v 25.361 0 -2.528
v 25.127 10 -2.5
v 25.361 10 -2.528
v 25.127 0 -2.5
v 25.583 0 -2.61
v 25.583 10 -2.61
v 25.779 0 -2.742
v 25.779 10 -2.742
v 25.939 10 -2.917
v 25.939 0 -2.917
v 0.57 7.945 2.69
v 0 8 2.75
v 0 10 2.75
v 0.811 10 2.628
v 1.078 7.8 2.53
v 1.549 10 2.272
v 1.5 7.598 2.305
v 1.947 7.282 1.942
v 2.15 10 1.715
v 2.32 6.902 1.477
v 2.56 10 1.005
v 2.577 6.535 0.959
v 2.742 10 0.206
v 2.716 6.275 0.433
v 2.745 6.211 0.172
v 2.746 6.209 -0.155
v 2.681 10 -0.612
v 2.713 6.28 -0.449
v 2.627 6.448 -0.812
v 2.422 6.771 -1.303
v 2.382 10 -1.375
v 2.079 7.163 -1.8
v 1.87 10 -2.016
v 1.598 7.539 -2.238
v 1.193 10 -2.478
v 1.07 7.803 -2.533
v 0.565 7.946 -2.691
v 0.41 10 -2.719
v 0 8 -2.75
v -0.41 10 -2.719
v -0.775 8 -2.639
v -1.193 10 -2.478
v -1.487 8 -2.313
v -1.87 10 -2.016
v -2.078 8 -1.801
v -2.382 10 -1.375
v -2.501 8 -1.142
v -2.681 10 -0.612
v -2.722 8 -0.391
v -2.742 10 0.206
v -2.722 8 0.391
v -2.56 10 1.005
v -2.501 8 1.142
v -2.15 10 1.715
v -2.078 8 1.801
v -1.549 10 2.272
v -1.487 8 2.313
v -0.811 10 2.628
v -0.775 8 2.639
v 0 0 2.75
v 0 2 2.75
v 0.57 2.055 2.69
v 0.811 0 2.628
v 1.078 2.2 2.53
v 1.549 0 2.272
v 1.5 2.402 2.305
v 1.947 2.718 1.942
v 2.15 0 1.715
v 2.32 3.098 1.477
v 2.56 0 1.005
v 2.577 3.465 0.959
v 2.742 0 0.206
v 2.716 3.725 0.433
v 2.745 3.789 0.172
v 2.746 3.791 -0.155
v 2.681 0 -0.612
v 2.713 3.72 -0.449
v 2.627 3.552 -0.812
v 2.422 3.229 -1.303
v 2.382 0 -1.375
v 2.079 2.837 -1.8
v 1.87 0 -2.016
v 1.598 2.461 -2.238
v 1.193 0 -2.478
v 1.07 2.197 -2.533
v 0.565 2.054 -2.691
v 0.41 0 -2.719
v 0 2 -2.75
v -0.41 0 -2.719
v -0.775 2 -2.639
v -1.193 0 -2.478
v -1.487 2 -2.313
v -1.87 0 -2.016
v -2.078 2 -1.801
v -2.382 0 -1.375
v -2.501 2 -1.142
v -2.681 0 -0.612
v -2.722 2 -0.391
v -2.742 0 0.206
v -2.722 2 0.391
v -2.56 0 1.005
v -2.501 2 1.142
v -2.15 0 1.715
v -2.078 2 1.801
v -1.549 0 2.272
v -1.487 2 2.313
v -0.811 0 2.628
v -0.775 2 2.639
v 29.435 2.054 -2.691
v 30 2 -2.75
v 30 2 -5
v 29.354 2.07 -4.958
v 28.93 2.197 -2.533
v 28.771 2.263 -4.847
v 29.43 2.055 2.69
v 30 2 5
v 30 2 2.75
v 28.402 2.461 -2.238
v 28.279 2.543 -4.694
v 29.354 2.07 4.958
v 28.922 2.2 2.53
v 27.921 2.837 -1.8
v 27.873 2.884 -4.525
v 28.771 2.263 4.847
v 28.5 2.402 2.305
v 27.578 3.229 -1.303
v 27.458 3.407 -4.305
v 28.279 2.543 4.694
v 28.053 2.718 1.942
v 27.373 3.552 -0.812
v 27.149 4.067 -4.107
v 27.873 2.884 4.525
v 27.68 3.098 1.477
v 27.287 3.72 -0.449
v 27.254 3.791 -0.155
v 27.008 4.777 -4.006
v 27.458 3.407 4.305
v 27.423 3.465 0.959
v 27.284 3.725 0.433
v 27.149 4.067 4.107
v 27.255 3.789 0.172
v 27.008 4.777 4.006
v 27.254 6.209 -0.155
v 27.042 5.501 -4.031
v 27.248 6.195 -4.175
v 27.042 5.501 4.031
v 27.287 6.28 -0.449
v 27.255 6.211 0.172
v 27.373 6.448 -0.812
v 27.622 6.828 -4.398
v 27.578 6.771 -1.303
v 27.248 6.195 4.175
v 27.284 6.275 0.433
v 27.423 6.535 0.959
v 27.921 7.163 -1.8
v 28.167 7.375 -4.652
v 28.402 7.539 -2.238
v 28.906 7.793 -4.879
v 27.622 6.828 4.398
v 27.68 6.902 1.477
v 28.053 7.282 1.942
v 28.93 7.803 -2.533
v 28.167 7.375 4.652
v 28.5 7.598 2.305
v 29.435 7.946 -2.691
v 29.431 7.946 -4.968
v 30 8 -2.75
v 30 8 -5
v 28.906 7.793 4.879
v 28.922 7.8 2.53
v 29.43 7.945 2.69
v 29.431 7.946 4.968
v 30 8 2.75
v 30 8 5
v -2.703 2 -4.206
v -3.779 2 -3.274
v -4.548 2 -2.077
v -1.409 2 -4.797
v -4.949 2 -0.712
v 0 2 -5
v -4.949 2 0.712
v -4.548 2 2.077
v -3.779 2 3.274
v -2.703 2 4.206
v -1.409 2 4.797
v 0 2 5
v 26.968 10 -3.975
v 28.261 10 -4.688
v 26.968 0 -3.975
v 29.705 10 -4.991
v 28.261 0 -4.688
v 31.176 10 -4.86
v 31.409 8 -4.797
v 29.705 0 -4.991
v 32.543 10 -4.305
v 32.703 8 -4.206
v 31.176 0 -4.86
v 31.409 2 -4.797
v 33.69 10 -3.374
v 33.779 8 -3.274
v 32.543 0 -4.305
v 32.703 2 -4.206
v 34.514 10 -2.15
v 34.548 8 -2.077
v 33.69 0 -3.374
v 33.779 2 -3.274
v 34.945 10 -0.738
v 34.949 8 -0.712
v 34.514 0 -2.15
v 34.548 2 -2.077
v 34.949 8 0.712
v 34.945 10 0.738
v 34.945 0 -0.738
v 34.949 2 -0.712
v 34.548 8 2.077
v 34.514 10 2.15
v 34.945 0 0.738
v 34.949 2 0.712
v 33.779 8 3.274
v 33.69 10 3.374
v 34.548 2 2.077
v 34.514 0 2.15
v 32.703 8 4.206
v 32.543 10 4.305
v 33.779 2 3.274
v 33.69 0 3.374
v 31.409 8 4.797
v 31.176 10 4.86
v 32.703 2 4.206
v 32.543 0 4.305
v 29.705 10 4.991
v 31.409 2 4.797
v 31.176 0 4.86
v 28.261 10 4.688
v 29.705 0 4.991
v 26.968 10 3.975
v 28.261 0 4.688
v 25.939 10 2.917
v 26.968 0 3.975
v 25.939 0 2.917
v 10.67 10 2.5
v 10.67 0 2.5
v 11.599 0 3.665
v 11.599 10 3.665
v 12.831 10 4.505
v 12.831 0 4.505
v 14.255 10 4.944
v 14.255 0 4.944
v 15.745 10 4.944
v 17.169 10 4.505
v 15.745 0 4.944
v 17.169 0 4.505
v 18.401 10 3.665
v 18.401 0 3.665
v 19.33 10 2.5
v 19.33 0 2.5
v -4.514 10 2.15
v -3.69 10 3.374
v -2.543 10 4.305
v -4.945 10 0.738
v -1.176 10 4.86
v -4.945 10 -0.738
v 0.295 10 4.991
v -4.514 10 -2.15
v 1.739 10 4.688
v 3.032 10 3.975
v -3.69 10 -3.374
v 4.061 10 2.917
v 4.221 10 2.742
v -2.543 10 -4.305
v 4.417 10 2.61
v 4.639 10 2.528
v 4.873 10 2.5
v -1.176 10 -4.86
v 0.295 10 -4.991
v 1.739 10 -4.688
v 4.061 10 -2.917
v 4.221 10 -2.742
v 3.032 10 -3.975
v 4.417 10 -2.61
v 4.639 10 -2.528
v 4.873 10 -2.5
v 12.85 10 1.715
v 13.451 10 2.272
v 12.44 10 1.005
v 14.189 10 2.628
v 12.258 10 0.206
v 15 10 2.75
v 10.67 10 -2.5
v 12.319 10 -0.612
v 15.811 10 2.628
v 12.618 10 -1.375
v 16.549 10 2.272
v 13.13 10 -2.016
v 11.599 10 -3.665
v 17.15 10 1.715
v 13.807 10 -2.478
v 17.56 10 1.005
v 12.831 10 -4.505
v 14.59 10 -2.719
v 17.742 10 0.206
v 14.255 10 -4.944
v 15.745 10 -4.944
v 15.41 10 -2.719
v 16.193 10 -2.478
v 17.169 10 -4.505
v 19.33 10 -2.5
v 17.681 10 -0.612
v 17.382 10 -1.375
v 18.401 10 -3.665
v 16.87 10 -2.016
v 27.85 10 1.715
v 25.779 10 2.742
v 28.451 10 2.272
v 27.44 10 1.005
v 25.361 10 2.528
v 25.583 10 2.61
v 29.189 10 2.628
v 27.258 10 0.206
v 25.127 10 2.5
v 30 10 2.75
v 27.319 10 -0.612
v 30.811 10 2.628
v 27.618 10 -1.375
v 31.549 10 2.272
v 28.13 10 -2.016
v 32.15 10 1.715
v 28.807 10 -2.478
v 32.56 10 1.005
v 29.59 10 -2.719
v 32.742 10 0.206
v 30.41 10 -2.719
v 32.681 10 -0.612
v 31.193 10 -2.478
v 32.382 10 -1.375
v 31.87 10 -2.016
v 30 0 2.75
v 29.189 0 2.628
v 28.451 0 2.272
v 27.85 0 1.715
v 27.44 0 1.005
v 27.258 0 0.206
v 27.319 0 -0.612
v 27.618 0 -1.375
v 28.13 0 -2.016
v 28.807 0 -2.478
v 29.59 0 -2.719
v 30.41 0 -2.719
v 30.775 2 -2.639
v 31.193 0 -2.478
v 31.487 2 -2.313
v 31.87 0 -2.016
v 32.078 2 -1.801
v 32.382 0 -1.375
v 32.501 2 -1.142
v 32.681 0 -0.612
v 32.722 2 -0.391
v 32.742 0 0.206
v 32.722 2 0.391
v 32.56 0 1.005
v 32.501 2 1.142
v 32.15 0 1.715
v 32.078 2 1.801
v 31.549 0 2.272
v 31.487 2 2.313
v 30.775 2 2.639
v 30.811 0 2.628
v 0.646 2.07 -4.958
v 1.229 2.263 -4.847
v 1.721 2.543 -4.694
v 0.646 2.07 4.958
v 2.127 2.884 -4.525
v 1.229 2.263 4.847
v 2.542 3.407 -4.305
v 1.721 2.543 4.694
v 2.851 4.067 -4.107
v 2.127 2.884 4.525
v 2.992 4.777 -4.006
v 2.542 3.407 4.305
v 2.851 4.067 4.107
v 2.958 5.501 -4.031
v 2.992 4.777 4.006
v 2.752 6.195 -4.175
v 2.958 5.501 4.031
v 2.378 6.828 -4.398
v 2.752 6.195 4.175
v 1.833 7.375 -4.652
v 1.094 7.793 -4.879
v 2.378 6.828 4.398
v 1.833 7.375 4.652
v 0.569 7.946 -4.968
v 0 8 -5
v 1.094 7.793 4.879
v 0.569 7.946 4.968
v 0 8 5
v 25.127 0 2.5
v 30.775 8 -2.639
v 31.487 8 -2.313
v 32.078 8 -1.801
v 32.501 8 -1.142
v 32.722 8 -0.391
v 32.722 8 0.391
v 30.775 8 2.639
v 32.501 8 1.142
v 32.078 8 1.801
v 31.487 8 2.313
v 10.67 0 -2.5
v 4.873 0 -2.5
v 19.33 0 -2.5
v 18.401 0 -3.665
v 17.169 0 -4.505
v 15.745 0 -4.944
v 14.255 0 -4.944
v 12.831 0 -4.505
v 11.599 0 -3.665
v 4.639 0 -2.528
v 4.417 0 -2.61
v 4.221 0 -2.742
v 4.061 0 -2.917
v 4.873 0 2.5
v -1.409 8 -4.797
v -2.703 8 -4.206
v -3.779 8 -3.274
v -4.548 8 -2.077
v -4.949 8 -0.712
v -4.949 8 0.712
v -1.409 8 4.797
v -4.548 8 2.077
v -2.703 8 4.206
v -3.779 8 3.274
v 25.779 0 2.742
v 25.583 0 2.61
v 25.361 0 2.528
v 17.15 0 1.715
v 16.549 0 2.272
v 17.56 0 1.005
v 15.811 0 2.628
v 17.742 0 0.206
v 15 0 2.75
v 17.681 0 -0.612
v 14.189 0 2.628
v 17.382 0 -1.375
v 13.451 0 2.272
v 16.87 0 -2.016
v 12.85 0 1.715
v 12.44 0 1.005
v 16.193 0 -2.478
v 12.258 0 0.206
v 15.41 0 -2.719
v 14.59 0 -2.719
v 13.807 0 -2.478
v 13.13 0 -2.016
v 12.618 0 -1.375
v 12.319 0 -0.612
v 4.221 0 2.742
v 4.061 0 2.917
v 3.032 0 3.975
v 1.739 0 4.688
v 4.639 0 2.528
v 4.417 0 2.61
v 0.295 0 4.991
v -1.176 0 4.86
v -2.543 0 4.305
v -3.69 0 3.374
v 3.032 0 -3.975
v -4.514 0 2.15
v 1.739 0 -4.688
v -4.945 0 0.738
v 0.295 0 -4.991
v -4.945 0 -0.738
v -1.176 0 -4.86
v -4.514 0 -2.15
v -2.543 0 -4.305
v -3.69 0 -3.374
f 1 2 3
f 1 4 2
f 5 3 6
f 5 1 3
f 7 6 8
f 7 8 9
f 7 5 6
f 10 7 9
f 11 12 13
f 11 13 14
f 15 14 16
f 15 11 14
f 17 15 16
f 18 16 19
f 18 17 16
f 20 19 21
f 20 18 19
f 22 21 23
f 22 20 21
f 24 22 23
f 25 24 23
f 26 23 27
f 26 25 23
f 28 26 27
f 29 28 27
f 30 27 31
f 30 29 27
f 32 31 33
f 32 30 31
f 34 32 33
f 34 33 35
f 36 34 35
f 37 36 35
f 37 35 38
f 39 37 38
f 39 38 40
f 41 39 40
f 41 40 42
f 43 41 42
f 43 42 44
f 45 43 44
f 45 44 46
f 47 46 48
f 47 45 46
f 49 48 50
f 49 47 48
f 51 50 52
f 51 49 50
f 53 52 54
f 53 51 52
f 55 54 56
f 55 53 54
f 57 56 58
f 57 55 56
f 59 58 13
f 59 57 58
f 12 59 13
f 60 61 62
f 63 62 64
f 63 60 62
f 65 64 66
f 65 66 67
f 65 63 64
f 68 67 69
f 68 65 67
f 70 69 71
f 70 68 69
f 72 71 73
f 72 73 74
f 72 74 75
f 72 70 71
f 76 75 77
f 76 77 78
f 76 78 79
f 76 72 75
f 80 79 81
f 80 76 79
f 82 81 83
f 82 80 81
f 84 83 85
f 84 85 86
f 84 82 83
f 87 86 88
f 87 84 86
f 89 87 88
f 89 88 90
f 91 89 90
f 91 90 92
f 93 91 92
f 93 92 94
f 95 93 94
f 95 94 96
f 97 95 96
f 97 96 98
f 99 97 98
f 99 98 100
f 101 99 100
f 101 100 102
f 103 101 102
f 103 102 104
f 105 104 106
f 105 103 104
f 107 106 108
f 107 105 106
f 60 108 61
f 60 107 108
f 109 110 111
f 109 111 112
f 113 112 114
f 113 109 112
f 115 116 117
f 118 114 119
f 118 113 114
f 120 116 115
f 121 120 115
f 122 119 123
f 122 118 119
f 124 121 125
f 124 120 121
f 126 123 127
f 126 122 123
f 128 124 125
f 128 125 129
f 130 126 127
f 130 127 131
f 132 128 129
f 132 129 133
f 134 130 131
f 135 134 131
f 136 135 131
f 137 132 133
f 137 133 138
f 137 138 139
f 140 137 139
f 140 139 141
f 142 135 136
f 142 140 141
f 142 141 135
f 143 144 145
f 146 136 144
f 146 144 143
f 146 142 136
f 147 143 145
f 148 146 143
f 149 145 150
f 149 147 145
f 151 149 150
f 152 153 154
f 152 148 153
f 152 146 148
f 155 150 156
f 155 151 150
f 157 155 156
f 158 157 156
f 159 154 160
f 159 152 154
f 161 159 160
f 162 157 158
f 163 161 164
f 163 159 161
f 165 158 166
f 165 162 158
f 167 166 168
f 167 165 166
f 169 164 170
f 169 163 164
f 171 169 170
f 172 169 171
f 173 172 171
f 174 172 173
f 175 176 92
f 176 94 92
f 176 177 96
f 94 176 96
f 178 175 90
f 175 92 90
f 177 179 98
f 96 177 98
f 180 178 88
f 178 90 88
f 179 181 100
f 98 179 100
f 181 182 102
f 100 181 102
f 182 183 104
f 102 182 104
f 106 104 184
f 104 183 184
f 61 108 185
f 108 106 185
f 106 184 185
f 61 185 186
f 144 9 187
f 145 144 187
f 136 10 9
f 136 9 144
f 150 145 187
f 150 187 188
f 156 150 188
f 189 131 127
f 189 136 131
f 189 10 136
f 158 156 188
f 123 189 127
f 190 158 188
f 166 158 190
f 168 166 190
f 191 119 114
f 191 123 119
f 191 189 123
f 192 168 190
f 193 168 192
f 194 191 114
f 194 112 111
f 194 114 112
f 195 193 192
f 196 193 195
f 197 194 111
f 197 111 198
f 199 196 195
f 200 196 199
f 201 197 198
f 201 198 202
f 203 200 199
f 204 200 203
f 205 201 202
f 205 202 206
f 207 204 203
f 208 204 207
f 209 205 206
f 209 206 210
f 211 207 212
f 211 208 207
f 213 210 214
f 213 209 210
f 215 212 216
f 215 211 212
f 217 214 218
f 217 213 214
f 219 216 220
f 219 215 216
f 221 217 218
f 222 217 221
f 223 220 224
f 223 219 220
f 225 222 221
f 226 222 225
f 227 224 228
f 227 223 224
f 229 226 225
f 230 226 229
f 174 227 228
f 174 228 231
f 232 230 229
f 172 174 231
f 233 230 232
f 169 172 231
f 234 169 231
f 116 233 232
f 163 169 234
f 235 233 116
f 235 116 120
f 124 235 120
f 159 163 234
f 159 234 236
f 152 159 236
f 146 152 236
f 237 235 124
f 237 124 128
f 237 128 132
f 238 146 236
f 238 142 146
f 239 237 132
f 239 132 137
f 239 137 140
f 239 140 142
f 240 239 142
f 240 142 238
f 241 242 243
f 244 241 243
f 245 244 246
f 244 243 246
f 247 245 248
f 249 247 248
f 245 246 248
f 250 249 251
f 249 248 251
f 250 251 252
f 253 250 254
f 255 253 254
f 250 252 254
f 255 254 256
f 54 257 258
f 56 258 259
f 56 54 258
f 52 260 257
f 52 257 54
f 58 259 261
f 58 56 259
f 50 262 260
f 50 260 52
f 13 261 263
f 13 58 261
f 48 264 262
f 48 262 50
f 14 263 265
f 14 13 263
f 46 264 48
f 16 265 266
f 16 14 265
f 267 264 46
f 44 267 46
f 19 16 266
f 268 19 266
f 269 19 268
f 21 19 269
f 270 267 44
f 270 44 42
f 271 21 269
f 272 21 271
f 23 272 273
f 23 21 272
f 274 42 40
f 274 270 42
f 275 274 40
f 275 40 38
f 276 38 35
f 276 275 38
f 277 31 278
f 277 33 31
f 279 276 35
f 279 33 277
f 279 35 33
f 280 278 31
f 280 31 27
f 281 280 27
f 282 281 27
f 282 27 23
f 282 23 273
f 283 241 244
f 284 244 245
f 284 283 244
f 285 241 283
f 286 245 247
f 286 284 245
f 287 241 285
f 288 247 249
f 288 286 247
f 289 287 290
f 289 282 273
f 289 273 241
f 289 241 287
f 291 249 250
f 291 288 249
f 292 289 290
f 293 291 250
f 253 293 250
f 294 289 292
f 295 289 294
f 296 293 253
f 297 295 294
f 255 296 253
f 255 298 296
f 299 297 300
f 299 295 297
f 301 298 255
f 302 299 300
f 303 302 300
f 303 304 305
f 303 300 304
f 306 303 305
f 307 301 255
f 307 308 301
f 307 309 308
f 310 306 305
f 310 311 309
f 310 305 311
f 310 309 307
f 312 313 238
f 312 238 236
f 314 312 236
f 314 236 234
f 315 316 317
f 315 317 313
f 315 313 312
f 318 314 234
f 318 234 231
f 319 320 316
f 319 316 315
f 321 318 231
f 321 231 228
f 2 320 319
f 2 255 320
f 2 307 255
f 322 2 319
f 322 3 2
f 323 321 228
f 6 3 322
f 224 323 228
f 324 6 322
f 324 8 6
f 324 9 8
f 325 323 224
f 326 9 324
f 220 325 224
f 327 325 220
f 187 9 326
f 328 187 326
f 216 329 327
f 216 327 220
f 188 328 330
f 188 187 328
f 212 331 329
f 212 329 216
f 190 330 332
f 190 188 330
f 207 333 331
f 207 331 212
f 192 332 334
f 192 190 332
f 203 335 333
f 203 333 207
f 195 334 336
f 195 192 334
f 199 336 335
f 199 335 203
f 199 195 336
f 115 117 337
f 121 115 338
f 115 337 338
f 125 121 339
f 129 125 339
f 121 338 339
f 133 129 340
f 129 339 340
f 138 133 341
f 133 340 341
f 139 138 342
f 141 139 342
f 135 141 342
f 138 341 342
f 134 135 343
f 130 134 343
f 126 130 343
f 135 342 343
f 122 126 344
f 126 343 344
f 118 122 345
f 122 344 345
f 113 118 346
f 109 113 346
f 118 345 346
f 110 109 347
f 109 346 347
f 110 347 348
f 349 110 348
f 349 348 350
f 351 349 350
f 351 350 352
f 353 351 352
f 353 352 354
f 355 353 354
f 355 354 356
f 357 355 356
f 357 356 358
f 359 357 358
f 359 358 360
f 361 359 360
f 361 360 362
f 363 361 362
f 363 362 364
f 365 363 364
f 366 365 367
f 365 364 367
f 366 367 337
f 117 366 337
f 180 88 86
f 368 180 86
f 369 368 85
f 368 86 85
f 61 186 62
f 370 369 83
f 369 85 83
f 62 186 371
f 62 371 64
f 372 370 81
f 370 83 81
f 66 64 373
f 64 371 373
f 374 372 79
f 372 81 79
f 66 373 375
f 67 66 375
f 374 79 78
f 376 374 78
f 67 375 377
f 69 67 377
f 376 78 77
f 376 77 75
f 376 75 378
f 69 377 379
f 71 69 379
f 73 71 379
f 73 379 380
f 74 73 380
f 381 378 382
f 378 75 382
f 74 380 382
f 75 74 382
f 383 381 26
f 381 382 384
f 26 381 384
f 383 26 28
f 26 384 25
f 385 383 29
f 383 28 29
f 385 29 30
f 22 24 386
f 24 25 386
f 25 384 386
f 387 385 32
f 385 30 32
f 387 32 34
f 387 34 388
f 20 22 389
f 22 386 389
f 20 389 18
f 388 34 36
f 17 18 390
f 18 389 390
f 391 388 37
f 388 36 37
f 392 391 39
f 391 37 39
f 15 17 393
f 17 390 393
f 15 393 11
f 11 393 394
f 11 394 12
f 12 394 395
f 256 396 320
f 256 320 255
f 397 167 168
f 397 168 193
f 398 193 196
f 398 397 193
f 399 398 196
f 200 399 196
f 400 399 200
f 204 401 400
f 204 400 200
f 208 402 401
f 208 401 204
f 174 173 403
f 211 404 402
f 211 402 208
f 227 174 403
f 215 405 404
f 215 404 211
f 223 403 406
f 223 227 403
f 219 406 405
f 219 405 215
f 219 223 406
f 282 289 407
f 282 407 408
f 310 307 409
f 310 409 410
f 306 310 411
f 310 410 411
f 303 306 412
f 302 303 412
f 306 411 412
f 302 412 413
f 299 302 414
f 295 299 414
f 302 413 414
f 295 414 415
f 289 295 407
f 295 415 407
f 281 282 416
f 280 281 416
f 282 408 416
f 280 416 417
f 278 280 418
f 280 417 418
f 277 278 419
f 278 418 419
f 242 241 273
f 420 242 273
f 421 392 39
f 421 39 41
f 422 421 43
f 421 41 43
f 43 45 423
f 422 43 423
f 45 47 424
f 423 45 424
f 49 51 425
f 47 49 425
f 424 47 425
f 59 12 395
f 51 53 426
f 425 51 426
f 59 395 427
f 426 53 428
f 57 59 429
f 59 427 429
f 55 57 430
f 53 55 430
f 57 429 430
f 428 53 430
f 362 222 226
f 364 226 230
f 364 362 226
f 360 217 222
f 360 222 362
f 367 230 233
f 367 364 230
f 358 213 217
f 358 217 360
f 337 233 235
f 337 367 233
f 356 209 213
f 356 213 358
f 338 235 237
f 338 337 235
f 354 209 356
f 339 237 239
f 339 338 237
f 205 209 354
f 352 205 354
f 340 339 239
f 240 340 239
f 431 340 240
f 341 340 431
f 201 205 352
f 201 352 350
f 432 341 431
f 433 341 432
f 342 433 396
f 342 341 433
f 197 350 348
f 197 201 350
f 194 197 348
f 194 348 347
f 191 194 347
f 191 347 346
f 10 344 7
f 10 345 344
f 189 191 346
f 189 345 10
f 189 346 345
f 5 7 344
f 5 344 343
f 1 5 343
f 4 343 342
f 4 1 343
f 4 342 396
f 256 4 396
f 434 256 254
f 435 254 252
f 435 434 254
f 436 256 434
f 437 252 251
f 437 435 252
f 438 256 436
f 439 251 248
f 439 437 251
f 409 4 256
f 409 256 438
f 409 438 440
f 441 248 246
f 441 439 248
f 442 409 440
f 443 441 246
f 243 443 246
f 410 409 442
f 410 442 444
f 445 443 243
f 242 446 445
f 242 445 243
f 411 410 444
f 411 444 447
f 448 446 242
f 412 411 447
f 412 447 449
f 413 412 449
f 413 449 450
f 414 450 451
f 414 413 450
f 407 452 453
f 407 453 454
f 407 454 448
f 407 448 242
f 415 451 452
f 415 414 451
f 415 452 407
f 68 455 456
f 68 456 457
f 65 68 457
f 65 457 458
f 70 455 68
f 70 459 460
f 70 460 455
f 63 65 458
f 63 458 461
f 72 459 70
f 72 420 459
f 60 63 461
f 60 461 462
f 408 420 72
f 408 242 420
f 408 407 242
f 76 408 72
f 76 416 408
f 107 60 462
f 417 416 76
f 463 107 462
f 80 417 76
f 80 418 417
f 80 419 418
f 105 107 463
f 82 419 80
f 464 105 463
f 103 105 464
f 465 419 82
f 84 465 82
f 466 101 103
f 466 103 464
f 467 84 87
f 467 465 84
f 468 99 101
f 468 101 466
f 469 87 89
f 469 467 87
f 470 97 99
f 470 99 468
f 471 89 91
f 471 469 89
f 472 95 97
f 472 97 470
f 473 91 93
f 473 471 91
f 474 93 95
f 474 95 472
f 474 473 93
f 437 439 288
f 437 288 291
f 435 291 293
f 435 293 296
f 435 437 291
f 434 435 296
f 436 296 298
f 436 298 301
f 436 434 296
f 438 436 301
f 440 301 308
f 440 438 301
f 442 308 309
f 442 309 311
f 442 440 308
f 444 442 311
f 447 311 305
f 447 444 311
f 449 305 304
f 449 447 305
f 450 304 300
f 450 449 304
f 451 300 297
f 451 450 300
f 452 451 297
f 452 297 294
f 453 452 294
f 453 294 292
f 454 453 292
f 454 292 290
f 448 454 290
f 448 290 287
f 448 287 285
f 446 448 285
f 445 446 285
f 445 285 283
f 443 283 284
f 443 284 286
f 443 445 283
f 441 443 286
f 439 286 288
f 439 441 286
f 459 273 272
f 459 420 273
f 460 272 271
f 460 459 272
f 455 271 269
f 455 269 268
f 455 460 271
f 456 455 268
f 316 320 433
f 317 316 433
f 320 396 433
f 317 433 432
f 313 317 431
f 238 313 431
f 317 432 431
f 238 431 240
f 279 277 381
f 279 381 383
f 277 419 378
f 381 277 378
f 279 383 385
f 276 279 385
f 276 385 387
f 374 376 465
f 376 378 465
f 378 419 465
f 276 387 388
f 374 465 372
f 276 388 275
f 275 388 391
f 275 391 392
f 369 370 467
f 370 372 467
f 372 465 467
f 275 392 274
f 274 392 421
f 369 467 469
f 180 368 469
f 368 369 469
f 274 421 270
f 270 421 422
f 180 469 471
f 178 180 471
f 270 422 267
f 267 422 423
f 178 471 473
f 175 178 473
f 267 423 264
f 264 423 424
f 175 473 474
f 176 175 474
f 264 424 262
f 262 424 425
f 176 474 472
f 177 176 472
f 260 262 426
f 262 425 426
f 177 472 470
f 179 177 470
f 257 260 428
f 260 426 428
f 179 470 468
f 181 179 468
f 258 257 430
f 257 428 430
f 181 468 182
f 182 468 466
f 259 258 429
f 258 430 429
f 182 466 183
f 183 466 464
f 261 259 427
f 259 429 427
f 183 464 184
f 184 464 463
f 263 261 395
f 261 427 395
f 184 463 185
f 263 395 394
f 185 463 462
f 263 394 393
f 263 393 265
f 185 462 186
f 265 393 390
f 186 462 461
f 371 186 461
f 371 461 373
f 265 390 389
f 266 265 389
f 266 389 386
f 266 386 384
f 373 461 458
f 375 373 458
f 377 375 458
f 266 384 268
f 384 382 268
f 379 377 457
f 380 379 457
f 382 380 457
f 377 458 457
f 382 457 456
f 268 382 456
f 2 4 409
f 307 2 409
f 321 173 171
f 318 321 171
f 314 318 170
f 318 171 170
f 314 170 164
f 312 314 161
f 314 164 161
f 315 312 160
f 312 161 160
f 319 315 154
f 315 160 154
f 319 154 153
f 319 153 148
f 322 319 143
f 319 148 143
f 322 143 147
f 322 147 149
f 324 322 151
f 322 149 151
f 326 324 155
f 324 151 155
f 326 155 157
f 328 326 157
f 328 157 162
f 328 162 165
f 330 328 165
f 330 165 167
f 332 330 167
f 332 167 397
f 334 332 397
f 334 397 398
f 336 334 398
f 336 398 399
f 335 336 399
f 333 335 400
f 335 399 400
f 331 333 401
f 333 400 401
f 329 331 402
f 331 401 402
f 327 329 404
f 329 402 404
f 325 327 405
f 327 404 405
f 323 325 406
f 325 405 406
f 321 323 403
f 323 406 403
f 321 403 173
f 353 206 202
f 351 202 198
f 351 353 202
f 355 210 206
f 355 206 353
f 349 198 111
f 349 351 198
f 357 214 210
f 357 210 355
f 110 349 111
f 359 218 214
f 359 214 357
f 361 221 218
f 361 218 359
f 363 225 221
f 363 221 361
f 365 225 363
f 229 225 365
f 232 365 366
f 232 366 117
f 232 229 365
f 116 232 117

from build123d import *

# Parameters (mm, degrees)
SKETCH1_W            = 15
SKETCH1_H            = 5
BOSS_EXTRUDE1_DEPTH  = 10
SKETCH2_R            = 5
BOSS_EXTRUDE2_DEPTH  = 10
CUT_EXTRUDE1_REACH   = 20.708
SKETCH3_R            = 2.75
CUT_EXTRUDE2_DEPTH   = 19.708286934
FILLET1_R            = 1
FILLET1_OF_MIRROR1_R = 1
SKETCH6_R            = 5
BOSS_EXTRUDE3_DEPTH  = 10
SKETCH7_R            = 2.75
CUT_EXTRUDE3_DEPTH   = 10


with BuildPart() as part:
    # Sketch1 → Boss-Extrude1 (new body)
    with BuildSketch(Plane(origin=(0, 0, 0), x_dir=(1, 0, 0), z_dir=(0, 1, 0))):
        with Locations((7.5, 0)):
            Rectangle(SKETCH1_W, SKETCH1_H)
    boss_extrude1 = extrude(amount=BOSS_EXTRUDE1_DEPTH)

    # Sketch2 → Boss-Extrude2 (add)
    with BuildSketch(Plane(origin=(0, 0, 0), x_dir=(1, 0, 0), z_dir=(0, 1, 0))):
        Circle(SKETCH2_R)
    boss_extrude2 = extrude(amount=BOSS_EXTRUDE2_DEPTH)

    # Sketch3 → Cut-Extrude1 (cut, up to next)
    with BuildSketch(Plane(origin=(0, 0, 0), x_dir=(1, 0, 0), z_dir=(0, 1, 0)), mode=Mode.PRIVATE) as cut_extrude1_sk1:
        with Locations(Location((0, 0, 0), (0, 0, 270))):
            Circle(SKETCH3_R)
    cut_extrude1_tool1 = extrude(cut_extrude1_sk1.sketch, amount=CUT_EXTRUDE1_REACH, mode=Mode.PRIVATE) & part.part
    cut_extrude1 = cut_extrude1_tool1.solids().sort_by_distance((0, 0, 0))[0]
    add(cut_extrude1, mode=Mode.SUBTRACT)

    # Sketch4 → Cut-Extrude2 (cut, symmetric)
    with BuildSketch(Plane.XY):
        with BuildLine():
            Line((0, 8), (-5, 8))
            Line((-5, 8), (-5, 2))
            Line((-5, 2), (0, 2))
            ThreePointArc((0, 2), (3, 5), (0, 8))
        make_face()
    cut_extrude2 = extrude(amount=CUT_EXTRUDE2_DEPTH, both=True, mode=Mode.SUBTRACT)

    # Fillet1
    fillet1_edges = [part.edges().sort_by_distance(p)[0] for p in [
        (4.330127019, 5, 2.5),
        (4.330127019, 5, -2.5),
    ]]
    fillet(fillet1_edges, radius=FILLET1_R)

    # Mirror1: Boss-Extrude1, Boss-Extrude2, Cut-Extrude1, Cut-Extrude2 across plane
    add(boss_extrude1.mirror(Plane(origin=(15, 10, -2.5), x_dir=(0, 0, 1), z_dir=(-1, 0, 0))))
    add(boss_extrude2.mirror(Plane(origin=(15, 10, -2.5), x_dir=(0, 0, 1), z_dir=(-1, 0, 0))))
    add(cut_extrude1.mirror(Plane(origin=(15, 10, -2.5), x_dir=(0, 0, 1), z_dir=(-1, 0, 0))), mode=Mode.SUBTRACT)
    add(cut_extrude2.mirror(Plane(origin=(15, 10, -2.5), x_dir=(0, 0, 1), z_dir=(-1, 0, 0))), mode=Mode.SUBTRACT)

    # Fillet1 of Mirror1
    fillet1_of_mirror1_edges = [part.edges().sort_by_distance(p)[0] for p in [
        (25.669872981, 5, 2.5),
        (25.669872981, 5, -2.5),
    ]]
    fillet(fillet1_of_mirror1_edges, radius=FILLET1_OF_MIRROR1_R)

    # Sketch6 → Boss-Extrude3 (add)
    with BuildSketch(Plane(origin=(0, 0, 0), x_dir=(1, 0, 0), z_dir=(0, 1, 0))):
        with Locations((15, 0)):
            Circle(SKETCH6_R)
    extrude(amount=BOSS_EXTRUDE3_DEPTH)

    # Sketch7 → Cut-Extrude3 (cut)
    with BuildSketch(Plane(origin=(0, 0, 0), x_dir=(1, 0, 0), z_dir=(0, 1, 0))):
        with Locations(Location((15, 0, 0), (0, 0, 270))):
            Circle(SKETCH7_R)
    extrude(amount=CUT_EXTRUDE3_DEPTH, mode=Mode.SUBTRACT)


solid = part.part
